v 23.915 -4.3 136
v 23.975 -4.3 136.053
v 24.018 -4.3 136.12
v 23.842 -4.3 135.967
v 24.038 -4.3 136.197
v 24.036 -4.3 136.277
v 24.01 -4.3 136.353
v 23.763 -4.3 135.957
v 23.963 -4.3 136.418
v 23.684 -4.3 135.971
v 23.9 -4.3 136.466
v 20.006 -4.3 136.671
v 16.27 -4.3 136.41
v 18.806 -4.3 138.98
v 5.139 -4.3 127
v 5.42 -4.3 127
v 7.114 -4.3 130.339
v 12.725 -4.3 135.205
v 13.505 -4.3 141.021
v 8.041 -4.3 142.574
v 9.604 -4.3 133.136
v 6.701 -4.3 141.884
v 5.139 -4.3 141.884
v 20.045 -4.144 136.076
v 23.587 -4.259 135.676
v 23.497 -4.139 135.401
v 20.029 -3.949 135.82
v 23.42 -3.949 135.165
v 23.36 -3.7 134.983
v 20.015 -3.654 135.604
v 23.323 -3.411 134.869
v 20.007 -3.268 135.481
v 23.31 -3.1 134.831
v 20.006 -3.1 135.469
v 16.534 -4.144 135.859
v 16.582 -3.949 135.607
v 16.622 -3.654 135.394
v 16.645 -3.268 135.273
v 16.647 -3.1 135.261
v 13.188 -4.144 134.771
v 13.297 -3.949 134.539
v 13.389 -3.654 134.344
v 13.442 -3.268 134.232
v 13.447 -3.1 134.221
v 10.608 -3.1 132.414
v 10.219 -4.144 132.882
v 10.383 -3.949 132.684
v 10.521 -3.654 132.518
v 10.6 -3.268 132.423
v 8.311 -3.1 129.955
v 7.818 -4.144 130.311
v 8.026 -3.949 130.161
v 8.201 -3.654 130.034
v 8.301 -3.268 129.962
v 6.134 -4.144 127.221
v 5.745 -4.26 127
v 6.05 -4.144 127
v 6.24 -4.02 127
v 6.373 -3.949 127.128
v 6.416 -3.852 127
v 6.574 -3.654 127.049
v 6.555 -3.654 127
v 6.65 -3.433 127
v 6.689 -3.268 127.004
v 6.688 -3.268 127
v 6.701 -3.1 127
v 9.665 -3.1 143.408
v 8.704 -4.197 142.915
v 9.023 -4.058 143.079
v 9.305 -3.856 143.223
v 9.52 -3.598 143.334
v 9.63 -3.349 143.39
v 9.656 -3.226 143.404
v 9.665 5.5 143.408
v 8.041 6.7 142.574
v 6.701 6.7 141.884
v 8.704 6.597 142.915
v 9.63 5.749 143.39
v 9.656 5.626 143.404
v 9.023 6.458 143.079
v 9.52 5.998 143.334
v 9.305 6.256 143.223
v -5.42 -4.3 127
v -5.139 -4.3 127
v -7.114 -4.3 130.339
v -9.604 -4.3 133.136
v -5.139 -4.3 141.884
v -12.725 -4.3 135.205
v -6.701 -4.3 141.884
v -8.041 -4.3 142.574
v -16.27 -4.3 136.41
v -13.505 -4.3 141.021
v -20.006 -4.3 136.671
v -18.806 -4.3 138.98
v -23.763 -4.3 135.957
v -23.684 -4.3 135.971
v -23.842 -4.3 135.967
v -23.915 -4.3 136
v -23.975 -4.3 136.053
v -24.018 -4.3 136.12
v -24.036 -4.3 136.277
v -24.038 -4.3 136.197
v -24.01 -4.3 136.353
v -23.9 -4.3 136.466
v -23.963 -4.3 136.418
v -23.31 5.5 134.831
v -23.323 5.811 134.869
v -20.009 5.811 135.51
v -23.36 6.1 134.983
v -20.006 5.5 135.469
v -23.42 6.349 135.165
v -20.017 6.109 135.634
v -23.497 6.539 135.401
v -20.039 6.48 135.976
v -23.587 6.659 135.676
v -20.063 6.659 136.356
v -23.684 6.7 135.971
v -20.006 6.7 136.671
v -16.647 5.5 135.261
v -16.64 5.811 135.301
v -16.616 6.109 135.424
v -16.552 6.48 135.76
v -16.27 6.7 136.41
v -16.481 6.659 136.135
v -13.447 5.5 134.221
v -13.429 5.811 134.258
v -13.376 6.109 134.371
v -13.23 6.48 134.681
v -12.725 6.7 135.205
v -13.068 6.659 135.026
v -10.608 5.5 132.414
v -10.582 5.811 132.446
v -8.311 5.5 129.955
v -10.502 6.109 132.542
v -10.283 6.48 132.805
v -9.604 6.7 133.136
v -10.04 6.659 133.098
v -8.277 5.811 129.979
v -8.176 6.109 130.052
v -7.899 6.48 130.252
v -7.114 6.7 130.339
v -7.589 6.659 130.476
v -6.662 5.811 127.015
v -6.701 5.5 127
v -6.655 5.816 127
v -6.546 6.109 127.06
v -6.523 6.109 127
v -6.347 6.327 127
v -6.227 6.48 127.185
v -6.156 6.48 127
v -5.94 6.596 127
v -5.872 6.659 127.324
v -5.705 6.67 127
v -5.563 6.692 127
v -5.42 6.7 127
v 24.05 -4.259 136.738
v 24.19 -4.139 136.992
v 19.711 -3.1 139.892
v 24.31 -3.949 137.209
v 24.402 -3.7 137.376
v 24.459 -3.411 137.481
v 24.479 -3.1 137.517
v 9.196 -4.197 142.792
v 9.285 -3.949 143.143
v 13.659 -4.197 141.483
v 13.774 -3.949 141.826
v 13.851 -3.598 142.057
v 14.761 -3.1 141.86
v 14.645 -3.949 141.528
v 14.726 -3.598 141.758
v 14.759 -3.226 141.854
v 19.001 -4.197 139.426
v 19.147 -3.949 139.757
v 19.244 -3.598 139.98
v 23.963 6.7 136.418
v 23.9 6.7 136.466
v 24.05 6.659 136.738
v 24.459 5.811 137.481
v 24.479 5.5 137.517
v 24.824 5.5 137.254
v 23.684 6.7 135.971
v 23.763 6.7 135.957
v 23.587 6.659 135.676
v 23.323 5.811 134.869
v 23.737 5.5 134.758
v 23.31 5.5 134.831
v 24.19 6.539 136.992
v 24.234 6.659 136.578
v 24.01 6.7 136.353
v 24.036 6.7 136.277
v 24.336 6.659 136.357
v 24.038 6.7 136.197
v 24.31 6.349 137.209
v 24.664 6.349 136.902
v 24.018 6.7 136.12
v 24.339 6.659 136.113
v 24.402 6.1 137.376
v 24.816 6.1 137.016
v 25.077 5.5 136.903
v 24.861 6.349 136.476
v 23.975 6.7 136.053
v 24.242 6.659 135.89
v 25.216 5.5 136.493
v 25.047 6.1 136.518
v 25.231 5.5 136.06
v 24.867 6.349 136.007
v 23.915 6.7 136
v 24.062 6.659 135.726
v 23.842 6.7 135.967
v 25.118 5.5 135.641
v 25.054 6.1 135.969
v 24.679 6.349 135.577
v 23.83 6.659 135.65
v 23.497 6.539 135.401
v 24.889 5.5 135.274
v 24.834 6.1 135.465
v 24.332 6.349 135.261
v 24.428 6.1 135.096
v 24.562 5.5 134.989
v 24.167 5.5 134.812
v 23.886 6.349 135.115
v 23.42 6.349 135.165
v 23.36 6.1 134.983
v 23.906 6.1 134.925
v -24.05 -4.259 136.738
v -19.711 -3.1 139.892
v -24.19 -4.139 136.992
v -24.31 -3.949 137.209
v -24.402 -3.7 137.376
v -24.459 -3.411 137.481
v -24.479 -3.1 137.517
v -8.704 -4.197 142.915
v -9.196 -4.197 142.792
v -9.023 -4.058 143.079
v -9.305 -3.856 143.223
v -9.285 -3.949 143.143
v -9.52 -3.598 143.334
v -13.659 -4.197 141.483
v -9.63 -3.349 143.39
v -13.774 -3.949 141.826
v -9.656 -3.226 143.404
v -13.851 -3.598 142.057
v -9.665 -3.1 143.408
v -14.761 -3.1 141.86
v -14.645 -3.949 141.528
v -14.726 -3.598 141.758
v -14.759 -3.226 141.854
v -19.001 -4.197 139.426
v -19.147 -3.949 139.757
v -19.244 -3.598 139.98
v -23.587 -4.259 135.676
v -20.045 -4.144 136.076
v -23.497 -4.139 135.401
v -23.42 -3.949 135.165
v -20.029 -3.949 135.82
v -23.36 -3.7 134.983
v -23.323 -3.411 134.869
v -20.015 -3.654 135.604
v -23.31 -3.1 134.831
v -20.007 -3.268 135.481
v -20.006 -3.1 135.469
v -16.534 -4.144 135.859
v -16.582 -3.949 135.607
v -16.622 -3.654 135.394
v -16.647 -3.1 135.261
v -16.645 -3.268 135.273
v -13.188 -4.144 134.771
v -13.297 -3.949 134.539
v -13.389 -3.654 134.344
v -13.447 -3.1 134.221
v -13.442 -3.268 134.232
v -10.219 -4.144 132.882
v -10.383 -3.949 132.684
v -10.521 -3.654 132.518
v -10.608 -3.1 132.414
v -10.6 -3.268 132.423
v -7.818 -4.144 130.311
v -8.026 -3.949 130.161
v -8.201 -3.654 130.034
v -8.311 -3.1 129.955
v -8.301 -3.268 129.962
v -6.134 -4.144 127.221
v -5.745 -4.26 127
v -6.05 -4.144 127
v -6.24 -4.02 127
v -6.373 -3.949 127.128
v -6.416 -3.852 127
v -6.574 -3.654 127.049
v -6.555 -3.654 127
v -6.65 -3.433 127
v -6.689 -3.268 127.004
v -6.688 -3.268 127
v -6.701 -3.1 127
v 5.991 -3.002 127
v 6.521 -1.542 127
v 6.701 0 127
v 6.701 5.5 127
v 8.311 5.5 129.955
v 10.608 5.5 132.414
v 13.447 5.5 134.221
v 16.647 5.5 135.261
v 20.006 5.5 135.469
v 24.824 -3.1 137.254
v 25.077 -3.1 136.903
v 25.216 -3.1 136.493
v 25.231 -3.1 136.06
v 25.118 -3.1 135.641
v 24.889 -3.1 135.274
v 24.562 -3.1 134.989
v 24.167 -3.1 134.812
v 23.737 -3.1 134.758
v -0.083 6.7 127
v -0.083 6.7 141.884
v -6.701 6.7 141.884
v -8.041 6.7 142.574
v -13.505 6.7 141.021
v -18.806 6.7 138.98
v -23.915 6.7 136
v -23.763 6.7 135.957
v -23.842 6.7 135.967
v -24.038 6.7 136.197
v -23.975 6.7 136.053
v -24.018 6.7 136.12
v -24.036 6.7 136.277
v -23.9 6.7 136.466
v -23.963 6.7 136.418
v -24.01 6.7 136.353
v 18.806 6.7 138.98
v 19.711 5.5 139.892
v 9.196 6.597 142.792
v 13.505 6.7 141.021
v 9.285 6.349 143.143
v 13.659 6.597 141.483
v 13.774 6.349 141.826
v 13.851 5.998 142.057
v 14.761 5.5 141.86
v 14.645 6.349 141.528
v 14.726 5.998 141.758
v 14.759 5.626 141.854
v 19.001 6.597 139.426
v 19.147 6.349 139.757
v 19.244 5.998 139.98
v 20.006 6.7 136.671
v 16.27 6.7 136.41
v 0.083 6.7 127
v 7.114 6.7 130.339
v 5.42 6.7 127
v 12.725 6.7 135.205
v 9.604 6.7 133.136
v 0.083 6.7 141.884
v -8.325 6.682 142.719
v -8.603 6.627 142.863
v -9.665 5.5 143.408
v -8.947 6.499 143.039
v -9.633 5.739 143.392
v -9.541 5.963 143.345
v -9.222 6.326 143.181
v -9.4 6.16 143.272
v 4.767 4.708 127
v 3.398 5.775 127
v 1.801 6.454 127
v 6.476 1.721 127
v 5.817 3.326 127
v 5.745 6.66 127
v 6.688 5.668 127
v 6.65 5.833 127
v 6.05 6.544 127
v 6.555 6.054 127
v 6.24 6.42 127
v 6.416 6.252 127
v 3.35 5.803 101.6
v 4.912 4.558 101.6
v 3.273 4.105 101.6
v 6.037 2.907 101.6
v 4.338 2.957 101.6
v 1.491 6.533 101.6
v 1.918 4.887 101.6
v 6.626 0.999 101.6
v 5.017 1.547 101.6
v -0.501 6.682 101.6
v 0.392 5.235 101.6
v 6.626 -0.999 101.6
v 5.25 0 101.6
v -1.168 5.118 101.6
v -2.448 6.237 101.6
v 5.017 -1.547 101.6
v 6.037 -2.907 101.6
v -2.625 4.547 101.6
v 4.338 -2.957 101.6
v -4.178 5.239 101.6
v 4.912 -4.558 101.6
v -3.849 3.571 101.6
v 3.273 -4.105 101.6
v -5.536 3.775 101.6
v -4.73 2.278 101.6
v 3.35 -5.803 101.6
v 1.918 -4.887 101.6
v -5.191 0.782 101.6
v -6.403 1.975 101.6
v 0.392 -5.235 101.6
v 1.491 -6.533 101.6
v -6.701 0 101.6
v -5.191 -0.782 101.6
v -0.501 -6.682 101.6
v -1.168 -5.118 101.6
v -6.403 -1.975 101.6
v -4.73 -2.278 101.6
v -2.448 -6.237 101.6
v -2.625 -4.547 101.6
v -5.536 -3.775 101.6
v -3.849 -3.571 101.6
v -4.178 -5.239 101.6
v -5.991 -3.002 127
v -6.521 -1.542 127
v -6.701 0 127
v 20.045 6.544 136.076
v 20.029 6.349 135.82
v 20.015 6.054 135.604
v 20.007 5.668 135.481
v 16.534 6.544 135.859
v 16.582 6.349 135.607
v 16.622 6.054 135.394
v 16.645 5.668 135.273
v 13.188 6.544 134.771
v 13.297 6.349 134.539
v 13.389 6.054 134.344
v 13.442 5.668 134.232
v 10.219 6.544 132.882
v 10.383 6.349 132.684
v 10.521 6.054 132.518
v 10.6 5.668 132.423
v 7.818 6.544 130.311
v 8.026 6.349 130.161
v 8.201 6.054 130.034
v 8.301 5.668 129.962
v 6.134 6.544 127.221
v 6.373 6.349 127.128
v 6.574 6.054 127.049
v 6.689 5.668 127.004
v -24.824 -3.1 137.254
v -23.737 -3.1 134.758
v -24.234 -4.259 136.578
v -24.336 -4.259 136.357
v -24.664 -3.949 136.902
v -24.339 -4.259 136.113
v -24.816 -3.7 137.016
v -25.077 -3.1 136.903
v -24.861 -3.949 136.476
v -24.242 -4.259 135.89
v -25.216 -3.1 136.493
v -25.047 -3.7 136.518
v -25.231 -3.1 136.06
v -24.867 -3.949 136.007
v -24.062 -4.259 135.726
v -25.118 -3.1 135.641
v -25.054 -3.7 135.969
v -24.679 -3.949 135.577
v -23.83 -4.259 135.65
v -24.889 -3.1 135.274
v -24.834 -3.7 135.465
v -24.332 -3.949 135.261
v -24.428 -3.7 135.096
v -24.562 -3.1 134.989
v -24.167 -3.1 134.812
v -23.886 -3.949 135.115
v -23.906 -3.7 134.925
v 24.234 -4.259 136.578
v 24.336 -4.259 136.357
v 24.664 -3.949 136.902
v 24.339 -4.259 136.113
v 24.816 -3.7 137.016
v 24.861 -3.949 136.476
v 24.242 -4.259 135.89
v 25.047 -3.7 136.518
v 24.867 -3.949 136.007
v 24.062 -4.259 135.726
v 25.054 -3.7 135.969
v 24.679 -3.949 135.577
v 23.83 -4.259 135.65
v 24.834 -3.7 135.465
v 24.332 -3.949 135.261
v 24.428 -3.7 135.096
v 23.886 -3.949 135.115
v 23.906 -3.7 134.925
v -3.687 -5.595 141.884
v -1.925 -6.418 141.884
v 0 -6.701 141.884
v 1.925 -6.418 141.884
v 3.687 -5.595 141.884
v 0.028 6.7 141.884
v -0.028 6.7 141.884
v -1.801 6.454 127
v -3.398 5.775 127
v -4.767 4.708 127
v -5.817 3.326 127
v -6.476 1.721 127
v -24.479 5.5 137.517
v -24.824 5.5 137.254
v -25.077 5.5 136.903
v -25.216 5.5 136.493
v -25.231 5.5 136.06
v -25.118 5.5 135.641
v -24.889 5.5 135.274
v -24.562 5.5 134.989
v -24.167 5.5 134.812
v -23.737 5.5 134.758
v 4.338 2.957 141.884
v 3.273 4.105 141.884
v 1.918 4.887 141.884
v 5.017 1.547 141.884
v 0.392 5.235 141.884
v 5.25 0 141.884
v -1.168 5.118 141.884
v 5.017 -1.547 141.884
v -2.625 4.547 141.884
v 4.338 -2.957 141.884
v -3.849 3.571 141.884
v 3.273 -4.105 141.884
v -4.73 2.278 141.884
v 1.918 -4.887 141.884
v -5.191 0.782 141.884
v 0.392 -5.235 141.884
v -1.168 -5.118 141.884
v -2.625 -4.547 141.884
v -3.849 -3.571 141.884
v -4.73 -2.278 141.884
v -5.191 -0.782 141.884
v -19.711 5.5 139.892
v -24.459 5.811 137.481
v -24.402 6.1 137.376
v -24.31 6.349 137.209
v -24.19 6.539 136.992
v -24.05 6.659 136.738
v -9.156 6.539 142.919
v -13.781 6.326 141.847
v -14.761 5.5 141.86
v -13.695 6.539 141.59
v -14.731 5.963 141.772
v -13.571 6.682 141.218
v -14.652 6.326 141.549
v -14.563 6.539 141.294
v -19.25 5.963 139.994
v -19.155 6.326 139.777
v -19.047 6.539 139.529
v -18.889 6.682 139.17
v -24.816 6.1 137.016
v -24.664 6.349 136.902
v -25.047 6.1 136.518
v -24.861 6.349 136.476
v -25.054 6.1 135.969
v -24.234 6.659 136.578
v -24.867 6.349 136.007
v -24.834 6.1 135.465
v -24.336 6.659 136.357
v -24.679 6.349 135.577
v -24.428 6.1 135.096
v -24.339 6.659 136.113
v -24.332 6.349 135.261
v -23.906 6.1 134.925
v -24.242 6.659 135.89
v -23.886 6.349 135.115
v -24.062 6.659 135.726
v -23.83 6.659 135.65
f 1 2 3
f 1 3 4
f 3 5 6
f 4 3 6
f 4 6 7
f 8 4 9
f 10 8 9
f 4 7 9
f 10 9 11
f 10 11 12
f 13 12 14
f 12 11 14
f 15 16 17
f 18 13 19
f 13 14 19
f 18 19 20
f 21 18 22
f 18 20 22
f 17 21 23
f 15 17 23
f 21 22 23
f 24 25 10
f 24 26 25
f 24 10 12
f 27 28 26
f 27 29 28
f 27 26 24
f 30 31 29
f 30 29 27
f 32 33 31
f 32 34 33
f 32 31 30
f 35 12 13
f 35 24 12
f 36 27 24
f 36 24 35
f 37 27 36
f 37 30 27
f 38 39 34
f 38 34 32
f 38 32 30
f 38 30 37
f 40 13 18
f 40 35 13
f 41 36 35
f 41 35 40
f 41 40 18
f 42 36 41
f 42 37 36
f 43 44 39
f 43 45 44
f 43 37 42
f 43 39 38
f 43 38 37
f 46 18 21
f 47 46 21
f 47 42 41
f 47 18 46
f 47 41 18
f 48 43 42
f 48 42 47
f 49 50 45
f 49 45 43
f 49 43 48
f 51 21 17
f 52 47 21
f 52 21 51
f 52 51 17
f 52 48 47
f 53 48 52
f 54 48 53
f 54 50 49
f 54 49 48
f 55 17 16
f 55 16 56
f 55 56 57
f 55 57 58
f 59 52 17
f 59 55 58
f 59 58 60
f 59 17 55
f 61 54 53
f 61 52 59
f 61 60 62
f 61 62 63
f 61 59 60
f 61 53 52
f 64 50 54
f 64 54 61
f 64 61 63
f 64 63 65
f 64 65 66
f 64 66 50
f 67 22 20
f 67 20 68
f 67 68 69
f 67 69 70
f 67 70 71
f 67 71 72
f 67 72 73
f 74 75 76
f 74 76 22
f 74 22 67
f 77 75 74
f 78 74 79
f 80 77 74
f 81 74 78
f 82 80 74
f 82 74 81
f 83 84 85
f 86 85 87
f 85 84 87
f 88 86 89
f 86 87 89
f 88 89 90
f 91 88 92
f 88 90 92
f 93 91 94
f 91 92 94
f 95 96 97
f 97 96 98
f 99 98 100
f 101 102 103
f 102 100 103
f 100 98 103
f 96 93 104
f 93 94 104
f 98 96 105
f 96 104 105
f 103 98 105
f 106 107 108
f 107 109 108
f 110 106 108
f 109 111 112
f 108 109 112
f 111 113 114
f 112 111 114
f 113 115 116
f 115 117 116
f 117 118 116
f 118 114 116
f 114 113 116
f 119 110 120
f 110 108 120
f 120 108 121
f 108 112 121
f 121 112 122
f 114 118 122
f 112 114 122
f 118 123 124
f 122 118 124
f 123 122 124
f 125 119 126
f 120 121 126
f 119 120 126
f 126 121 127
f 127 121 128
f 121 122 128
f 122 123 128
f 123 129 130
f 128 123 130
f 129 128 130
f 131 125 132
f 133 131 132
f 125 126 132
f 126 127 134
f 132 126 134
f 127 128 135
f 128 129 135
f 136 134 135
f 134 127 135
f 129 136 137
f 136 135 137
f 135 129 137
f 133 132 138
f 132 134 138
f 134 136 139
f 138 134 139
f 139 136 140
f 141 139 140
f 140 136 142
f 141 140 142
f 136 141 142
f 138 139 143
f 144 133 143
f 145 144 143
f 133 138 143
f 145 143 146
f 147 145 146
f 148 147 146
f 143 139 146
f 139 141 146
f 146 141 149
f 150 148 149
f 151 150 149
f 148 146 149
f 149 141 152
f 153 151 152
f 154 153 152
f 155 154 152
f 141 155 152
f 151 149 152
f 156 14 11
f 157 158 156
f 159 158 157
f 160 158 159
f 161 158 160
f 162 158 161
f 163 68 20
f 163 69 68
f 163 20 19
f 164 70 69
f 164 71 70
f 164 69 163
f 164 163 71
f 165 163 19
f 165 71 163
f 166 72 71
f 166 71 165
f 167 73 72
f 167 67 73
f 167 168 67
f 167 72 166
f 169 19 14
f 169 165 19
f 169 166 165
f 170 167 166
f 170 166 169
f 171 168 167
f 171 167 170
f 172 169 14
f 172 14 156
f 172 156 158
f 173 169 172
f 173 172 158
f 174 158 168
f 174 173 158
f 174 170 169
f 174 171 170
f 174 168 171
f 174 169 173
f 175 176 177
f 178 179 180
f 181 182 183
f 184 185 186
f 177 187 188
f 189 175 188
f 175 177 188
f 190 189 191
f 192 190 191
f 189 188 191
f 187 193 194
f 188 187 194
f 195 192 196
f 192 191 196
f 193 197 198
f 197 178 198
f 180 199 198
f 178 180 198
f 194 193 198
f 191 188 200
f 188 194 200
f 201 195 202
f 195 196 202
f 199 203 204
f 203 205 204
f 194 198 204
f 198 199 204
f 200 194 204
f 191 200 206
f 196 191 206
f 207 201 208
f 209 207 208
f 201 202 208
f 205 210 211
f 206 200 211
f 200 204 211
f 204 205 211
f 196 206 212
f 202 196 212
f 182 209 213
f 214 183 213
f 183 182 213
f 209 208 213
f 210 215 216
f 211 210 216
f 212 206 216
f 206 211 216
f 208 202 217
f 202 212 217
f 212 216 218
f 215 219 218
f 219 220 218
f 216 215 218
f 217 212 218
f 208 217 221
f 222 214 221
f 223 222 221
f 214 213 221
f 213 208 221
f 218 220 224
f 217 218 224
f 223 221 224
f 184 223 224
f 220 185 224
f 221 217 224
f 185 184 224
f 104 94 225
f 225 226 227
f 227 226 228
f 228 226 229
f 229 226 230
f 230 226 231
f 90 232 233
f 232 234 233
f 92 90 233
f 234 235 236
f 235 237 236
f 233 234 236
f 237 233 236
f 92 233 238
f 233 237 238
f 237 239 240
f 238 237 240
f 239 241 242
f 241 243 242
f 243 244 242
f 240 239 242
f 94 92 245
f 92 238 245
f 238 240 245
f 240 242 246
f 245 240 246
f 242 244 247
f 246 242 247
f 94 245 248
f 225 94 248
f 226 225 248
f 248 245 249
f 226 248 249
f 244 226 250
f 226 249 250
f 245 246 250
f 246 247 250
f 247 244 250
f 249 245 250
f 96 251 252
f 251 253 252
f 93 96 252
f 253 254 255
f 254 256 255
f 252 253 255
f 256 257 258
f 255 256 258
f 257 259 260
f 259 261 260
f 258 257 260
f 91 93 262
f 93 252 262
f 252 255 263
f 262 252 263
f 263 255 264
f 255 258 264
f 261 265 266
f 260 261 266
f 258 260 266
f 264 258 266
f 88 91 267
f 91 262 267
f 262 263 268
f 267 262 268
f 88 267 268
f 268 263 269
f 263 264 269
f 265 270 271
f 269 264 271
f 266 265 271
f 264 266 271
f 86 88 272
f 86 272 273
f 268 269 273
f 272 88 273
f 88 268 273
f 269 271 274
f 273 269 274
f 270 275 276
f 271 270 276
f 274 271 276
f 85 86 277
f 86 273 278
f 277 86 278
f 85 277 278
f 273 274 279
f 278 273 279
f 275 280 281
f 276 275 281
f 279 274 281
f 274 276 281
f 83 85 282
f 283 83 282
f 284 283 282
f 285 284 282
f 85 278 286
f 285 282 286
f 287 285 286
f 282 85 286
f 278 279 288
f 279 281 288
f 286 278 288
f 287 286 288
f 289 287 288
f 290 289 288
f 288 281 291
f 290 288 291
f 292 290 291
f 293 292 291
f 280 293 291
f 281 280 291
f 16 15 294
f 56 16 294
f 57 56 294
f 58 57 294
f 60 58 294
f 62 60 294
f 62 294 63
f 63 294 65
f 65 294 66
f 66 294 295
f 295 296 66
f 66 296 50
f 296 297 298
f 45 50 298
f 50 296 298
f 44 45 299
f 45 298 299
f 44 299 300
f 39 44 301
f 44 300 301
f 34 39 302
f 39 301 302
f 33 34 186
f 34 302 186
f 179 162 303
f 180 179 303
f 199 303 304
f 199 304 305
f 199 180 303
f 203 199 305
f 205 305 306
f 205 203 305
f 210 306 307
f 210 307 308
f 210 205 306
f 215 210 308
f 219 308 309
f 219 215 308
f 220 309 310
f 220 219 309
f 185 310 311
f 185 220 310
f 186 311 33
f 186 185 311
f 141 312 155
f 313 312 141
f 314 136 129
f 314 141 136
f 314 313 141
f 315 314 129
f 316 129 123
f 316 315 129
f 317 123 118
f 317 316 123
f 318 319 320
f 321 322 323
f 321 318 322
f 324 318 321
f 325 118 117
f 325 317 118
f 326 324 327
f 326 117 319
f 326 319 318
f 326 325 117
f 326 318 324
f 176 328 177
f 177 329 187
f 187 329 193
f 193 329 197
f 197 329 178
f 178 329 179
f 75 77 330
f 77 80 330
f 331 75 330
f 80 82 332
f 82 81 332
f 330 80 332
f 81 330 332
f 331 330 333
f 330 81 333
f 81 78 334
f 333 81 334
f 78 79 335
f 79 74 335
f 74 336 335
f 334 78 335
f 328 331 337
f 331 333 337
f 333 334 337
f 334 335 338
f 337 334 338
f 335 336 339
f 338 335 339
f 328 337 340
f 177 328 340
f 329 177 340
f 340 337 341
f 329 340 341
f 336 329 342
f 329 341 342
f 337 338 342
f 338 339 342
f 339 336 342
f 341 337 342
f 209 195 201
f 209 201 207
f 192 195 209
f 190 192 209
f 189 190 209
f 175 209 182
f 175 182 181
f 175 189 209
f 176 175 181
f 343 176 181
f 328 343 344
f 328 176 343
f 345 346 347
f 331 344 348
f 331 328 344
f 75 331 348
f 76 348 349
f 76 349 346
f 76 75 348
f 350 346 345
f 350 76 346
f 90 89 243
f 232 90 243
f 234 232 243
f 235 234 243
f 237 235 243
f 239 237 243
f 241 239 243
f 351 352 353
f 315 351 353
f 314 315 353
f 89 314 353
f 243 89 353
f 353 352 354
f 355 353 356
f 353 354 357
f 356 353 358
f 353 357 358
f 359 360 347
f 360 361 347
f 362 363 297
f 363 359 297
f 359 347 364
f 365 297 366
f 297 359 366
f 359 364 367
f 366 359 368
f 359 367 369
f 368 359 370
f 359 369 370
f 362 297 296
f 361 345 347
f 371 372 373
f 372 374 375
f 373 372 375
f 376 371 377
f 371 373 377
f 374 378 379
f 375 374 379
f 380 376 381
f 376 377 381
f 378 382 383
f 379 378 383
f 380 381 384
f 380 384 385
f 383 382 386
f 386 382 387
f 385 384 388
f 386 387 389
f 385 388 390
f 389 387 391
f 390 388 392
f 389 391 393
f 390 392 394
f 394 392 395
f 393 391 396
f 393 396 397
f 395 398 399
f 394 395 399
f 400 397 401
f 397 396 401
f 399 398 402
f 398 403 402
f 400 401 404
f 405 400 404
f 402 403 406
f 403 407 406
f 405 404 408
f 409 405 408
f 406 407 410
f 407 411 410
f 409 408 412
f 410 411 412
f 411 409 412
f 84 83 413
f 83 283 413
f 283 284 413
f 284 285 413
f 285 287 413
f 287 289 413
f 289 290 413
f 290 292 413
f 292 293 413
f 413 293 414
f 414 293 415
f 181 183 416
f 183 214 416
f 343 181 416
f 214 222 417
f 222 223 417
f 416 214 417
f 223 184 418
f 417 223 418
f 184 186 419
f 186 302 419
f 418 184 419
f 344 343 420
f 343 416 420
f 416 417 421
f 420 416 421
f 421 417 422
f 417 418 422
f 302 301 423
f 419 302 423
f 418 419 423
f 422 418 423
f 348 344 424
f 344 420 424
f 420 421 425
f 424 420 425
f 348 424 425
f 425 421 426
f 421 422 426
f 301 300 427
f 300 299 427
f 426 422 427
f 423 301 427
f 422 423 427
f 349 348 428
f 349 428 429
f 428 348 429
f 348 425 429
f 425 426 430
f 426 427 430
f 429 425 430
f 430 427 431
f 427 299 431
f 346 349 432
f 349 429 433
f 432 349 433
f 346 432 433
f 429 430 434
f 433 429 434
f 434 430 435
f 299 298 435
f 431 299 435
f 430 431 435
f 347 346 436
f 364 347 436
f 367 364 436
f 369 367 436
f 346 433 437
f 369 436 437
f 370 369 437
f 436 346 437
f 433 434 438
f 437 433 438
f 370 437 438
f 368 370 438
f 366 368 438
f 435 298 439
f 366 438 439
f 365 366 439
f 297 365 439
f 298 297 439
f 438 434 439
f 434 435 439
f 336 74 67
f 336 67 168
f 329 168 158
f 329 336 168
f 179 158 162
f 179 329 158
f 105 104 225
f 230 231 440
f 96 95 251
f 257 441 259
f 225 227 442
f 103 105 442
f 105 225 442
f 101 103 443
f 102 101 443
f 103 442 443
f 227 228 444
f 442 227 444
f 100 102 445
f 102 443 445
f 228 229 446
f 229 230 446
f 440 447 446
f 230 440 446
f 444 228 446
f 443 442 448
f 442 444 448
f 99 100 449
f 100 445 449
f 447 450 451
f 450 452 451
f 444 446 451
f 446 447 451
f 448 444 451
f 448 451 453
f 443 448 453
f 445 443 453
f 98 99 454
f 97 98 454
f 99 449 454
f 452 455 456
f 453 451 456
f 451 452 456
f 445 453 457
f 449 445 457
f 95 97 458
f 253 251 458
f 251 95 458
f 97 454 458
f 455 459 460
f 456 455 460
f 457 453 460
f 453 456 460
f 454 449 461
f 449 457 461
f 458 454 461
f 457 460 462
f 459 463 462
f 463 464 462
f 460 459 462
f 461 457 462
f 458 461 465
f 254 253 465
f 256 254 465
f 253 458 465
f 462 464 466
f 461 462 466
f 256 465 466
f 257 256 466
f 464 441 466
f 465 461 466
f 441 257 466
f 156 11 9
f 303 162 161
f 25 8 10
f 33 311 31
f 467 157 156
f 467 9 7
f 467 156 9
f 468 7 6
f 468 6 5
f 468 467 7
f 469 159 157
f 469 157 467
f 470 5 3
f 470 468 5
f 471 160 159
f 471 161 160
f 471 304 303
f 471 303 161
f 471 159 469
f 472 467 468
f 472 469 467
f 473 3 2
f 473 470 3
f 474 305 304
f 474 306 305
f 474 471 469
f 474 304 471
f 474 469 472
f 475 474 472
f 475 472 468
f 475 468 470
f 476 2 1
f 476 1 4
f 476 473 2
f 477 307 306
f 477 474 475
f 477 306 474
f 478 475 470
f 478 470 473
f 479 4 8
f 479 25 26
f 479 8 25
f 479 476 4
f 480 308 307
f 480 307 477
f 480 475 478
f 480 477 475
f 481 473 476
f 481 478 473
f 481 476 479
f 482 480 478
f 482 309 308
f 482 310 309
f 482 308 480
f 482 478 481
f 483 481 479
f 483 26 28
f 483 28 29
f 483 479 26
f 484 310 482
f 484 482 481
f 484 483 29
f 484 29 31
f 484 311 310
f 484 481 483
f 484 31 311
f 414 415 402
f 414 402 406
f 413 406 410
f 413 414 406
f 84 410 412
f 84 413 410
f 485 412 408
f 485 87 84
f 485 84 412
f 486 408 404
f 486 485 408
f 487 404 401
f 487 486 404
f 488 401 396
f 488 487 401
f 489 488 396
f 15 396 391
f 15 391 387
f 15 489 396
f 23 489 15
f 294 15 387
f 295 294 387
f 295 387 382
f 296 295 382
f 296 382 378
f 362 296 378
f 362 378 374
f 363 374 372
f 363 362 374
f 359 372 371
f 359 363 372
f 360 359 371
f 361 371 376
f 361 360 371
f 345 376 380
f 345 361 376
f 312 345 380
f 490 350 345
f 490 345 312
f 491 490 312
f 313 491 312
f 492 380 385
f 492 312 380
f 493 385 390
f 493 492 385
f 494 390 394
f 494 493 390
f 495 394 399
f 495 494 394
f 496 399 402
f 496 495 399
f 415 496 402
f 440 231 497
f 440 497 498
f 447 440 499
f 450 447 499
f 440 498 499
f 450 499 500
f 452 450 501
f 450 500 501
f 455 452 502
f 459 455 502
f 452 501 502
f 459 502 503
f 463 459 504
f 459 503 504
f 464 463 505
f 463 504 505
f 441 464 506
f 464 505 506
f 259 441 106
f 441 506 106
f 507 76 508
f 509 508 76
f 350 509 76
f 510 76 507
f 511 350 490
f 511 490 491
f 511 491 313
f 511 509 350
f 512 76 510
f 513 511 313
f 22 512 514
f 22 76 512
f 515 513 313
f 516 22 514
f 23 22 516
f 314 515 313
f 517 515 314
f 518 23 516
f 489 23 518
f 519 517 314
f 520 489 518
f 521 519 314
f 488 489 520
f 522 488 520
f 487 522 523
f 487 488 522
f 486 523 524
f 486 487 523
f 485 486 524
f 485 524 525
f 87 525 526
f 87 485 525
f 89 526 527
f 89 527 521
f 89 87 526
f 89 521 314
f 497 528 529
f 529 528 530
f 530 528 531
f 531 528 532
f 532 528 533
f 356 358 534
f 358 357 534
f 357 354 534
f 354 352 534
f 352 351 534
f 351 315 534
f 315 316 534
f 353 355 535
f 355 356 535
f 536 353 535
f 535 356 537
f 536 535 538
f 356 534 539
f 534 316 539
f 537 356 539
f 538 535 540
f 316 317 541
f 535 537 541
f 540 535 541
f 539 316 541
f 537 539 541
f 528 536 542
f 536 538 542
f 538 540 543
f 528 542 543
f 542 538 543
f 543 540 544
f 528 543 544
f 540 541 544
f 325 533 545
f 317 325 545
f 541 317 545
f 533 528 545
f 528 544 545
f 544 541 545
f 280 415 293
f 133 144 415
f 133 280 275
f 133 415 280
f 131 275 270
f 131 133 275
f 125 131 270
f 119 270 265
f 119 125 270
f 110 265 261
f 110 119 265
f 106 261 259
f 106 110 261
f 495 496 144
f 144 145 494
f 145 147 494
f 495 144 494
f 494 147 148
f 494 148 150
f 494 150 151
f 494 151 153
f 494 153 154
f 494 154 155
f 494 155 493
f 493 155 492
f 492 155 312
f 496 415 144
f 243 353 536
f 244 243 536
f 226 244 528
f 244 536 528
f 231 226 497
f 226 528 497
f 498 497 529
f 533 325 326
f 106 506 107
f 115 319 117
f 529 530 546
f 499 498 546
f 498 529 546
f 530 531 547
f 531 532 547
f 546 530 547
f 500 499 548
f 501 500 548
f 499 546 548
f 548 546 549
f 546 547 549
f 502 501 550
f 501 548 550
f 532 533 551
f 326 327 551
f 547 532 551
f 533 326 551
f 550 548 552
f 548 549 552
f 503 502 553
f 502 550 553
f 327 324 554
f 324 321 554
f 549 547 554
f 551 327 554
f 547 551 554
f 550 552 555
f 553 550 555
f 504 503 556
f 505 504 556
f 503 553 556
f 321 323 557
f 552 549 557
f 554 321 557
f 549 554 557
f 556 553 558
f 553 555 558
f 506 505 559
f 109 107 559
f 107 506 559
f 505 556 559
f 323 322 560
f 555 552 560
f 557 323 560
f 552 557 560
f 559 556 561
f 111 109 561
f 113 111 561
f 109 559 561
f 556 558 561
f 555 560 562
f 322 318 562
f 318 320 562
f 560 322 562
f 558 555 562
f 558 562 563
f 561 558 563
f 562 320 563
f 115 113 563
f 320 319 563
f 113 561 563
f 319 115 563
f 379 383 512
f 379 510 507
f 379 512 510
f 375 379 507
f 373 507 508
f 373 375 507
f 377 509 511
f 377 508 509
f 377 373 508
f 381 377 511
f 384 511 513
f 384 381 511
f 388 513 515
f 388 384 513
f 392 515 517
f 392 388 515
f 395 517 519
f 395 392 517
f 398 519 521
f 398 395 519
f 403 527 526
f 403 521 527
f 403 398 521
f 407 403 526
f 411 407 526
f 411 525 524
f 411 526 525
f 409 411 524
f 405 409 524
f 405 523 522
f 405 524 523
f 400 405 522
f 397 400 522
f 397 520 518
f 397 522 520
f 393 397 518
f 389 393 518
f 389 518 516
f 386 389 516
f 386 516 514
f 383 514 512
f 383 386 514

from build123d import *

# Parameters (mm, degrees)
PAD001_DEPTH      = 11
FILLET001_R       = 1.2
SKETCH005_W       = 6.70052
SKETCH005_H       = 40.2844
SKETCH006_R       = 5.25
POCKET_DEPTH      = 0.001
POCKET_DEPTH_BACK = 143.4094


with BuildPart() as part:
    # Sketch004 → Pad001 (new body)
    with BuildSketch(Plane.XZ.offset(-6.7)):
        with BuildLine():
            Line((-6.70052, 141.8844), (-9.6647, 143.4084))
            ThreePointArc((-9.6647, 143.4084), (-17.256712, 140.927389), (-24.479189, 137.517128))
            ThreePointArc((-24.479189, 137.517128), (-25.118047, 135.6415), (-23.310129, 134.830602))
            ThreePointArc((-6.70052, 127), (-13.446839, 134.221029), (-23.310129, 134.830602))
            Line((0, 127), (-6.70052, 127))
            Line((0, 141.8844), (0, 127))
            Line((-6.70052, 141.8844), (0, 141.8844))
        make_face()
    pad001 = extrude(amount=PAD001_DEPTH)

    # Mirrored: Pad001 across Sketch004 V_Axis
    add(pad001.mirror(Plane(origin=(0, 6.7, 0), x_dir=(0, -1, 0), z_dir=(1, 0, 0))))

    # Fillet001
    fillet001_edges = [part.edges().sort_by_distance(p)[0] for p in [
        (17.256712, 6.7, 140.927389),
        (17.256712, -4.3, 140.927389),
        (-17.256712, -4.3, 140.927389),
        (-17.256712, 6.7, 140.927389),
    ]]
    fillet(fillet001_edges, radius=FILLET001_R)

    # Sketch005 → Revolution (revolve)
    with BuildSketch(Plane.XZ):
        with Locations((-3.35026, 121.7422)):
            Rectangle(SKETCH005_W, SKETCH005_H)
    revolve(axis=Axis((0, 0, 0), (0, 0, 1)))

    # Sketch006 → Pocket (cut, two sides)
    with BuildSketch(Plane.XY) as pocket_sk:
        Circle(SKETCH006_R)
    extrude(amount=-POCKET_DEPTH, mode=Mode.SUBTRACT)
    extrude(pocket_sk.sketch, amount=POCKET_DEPTH_BACK, mode=Mode.SUBTRACT)


solid = part.part
